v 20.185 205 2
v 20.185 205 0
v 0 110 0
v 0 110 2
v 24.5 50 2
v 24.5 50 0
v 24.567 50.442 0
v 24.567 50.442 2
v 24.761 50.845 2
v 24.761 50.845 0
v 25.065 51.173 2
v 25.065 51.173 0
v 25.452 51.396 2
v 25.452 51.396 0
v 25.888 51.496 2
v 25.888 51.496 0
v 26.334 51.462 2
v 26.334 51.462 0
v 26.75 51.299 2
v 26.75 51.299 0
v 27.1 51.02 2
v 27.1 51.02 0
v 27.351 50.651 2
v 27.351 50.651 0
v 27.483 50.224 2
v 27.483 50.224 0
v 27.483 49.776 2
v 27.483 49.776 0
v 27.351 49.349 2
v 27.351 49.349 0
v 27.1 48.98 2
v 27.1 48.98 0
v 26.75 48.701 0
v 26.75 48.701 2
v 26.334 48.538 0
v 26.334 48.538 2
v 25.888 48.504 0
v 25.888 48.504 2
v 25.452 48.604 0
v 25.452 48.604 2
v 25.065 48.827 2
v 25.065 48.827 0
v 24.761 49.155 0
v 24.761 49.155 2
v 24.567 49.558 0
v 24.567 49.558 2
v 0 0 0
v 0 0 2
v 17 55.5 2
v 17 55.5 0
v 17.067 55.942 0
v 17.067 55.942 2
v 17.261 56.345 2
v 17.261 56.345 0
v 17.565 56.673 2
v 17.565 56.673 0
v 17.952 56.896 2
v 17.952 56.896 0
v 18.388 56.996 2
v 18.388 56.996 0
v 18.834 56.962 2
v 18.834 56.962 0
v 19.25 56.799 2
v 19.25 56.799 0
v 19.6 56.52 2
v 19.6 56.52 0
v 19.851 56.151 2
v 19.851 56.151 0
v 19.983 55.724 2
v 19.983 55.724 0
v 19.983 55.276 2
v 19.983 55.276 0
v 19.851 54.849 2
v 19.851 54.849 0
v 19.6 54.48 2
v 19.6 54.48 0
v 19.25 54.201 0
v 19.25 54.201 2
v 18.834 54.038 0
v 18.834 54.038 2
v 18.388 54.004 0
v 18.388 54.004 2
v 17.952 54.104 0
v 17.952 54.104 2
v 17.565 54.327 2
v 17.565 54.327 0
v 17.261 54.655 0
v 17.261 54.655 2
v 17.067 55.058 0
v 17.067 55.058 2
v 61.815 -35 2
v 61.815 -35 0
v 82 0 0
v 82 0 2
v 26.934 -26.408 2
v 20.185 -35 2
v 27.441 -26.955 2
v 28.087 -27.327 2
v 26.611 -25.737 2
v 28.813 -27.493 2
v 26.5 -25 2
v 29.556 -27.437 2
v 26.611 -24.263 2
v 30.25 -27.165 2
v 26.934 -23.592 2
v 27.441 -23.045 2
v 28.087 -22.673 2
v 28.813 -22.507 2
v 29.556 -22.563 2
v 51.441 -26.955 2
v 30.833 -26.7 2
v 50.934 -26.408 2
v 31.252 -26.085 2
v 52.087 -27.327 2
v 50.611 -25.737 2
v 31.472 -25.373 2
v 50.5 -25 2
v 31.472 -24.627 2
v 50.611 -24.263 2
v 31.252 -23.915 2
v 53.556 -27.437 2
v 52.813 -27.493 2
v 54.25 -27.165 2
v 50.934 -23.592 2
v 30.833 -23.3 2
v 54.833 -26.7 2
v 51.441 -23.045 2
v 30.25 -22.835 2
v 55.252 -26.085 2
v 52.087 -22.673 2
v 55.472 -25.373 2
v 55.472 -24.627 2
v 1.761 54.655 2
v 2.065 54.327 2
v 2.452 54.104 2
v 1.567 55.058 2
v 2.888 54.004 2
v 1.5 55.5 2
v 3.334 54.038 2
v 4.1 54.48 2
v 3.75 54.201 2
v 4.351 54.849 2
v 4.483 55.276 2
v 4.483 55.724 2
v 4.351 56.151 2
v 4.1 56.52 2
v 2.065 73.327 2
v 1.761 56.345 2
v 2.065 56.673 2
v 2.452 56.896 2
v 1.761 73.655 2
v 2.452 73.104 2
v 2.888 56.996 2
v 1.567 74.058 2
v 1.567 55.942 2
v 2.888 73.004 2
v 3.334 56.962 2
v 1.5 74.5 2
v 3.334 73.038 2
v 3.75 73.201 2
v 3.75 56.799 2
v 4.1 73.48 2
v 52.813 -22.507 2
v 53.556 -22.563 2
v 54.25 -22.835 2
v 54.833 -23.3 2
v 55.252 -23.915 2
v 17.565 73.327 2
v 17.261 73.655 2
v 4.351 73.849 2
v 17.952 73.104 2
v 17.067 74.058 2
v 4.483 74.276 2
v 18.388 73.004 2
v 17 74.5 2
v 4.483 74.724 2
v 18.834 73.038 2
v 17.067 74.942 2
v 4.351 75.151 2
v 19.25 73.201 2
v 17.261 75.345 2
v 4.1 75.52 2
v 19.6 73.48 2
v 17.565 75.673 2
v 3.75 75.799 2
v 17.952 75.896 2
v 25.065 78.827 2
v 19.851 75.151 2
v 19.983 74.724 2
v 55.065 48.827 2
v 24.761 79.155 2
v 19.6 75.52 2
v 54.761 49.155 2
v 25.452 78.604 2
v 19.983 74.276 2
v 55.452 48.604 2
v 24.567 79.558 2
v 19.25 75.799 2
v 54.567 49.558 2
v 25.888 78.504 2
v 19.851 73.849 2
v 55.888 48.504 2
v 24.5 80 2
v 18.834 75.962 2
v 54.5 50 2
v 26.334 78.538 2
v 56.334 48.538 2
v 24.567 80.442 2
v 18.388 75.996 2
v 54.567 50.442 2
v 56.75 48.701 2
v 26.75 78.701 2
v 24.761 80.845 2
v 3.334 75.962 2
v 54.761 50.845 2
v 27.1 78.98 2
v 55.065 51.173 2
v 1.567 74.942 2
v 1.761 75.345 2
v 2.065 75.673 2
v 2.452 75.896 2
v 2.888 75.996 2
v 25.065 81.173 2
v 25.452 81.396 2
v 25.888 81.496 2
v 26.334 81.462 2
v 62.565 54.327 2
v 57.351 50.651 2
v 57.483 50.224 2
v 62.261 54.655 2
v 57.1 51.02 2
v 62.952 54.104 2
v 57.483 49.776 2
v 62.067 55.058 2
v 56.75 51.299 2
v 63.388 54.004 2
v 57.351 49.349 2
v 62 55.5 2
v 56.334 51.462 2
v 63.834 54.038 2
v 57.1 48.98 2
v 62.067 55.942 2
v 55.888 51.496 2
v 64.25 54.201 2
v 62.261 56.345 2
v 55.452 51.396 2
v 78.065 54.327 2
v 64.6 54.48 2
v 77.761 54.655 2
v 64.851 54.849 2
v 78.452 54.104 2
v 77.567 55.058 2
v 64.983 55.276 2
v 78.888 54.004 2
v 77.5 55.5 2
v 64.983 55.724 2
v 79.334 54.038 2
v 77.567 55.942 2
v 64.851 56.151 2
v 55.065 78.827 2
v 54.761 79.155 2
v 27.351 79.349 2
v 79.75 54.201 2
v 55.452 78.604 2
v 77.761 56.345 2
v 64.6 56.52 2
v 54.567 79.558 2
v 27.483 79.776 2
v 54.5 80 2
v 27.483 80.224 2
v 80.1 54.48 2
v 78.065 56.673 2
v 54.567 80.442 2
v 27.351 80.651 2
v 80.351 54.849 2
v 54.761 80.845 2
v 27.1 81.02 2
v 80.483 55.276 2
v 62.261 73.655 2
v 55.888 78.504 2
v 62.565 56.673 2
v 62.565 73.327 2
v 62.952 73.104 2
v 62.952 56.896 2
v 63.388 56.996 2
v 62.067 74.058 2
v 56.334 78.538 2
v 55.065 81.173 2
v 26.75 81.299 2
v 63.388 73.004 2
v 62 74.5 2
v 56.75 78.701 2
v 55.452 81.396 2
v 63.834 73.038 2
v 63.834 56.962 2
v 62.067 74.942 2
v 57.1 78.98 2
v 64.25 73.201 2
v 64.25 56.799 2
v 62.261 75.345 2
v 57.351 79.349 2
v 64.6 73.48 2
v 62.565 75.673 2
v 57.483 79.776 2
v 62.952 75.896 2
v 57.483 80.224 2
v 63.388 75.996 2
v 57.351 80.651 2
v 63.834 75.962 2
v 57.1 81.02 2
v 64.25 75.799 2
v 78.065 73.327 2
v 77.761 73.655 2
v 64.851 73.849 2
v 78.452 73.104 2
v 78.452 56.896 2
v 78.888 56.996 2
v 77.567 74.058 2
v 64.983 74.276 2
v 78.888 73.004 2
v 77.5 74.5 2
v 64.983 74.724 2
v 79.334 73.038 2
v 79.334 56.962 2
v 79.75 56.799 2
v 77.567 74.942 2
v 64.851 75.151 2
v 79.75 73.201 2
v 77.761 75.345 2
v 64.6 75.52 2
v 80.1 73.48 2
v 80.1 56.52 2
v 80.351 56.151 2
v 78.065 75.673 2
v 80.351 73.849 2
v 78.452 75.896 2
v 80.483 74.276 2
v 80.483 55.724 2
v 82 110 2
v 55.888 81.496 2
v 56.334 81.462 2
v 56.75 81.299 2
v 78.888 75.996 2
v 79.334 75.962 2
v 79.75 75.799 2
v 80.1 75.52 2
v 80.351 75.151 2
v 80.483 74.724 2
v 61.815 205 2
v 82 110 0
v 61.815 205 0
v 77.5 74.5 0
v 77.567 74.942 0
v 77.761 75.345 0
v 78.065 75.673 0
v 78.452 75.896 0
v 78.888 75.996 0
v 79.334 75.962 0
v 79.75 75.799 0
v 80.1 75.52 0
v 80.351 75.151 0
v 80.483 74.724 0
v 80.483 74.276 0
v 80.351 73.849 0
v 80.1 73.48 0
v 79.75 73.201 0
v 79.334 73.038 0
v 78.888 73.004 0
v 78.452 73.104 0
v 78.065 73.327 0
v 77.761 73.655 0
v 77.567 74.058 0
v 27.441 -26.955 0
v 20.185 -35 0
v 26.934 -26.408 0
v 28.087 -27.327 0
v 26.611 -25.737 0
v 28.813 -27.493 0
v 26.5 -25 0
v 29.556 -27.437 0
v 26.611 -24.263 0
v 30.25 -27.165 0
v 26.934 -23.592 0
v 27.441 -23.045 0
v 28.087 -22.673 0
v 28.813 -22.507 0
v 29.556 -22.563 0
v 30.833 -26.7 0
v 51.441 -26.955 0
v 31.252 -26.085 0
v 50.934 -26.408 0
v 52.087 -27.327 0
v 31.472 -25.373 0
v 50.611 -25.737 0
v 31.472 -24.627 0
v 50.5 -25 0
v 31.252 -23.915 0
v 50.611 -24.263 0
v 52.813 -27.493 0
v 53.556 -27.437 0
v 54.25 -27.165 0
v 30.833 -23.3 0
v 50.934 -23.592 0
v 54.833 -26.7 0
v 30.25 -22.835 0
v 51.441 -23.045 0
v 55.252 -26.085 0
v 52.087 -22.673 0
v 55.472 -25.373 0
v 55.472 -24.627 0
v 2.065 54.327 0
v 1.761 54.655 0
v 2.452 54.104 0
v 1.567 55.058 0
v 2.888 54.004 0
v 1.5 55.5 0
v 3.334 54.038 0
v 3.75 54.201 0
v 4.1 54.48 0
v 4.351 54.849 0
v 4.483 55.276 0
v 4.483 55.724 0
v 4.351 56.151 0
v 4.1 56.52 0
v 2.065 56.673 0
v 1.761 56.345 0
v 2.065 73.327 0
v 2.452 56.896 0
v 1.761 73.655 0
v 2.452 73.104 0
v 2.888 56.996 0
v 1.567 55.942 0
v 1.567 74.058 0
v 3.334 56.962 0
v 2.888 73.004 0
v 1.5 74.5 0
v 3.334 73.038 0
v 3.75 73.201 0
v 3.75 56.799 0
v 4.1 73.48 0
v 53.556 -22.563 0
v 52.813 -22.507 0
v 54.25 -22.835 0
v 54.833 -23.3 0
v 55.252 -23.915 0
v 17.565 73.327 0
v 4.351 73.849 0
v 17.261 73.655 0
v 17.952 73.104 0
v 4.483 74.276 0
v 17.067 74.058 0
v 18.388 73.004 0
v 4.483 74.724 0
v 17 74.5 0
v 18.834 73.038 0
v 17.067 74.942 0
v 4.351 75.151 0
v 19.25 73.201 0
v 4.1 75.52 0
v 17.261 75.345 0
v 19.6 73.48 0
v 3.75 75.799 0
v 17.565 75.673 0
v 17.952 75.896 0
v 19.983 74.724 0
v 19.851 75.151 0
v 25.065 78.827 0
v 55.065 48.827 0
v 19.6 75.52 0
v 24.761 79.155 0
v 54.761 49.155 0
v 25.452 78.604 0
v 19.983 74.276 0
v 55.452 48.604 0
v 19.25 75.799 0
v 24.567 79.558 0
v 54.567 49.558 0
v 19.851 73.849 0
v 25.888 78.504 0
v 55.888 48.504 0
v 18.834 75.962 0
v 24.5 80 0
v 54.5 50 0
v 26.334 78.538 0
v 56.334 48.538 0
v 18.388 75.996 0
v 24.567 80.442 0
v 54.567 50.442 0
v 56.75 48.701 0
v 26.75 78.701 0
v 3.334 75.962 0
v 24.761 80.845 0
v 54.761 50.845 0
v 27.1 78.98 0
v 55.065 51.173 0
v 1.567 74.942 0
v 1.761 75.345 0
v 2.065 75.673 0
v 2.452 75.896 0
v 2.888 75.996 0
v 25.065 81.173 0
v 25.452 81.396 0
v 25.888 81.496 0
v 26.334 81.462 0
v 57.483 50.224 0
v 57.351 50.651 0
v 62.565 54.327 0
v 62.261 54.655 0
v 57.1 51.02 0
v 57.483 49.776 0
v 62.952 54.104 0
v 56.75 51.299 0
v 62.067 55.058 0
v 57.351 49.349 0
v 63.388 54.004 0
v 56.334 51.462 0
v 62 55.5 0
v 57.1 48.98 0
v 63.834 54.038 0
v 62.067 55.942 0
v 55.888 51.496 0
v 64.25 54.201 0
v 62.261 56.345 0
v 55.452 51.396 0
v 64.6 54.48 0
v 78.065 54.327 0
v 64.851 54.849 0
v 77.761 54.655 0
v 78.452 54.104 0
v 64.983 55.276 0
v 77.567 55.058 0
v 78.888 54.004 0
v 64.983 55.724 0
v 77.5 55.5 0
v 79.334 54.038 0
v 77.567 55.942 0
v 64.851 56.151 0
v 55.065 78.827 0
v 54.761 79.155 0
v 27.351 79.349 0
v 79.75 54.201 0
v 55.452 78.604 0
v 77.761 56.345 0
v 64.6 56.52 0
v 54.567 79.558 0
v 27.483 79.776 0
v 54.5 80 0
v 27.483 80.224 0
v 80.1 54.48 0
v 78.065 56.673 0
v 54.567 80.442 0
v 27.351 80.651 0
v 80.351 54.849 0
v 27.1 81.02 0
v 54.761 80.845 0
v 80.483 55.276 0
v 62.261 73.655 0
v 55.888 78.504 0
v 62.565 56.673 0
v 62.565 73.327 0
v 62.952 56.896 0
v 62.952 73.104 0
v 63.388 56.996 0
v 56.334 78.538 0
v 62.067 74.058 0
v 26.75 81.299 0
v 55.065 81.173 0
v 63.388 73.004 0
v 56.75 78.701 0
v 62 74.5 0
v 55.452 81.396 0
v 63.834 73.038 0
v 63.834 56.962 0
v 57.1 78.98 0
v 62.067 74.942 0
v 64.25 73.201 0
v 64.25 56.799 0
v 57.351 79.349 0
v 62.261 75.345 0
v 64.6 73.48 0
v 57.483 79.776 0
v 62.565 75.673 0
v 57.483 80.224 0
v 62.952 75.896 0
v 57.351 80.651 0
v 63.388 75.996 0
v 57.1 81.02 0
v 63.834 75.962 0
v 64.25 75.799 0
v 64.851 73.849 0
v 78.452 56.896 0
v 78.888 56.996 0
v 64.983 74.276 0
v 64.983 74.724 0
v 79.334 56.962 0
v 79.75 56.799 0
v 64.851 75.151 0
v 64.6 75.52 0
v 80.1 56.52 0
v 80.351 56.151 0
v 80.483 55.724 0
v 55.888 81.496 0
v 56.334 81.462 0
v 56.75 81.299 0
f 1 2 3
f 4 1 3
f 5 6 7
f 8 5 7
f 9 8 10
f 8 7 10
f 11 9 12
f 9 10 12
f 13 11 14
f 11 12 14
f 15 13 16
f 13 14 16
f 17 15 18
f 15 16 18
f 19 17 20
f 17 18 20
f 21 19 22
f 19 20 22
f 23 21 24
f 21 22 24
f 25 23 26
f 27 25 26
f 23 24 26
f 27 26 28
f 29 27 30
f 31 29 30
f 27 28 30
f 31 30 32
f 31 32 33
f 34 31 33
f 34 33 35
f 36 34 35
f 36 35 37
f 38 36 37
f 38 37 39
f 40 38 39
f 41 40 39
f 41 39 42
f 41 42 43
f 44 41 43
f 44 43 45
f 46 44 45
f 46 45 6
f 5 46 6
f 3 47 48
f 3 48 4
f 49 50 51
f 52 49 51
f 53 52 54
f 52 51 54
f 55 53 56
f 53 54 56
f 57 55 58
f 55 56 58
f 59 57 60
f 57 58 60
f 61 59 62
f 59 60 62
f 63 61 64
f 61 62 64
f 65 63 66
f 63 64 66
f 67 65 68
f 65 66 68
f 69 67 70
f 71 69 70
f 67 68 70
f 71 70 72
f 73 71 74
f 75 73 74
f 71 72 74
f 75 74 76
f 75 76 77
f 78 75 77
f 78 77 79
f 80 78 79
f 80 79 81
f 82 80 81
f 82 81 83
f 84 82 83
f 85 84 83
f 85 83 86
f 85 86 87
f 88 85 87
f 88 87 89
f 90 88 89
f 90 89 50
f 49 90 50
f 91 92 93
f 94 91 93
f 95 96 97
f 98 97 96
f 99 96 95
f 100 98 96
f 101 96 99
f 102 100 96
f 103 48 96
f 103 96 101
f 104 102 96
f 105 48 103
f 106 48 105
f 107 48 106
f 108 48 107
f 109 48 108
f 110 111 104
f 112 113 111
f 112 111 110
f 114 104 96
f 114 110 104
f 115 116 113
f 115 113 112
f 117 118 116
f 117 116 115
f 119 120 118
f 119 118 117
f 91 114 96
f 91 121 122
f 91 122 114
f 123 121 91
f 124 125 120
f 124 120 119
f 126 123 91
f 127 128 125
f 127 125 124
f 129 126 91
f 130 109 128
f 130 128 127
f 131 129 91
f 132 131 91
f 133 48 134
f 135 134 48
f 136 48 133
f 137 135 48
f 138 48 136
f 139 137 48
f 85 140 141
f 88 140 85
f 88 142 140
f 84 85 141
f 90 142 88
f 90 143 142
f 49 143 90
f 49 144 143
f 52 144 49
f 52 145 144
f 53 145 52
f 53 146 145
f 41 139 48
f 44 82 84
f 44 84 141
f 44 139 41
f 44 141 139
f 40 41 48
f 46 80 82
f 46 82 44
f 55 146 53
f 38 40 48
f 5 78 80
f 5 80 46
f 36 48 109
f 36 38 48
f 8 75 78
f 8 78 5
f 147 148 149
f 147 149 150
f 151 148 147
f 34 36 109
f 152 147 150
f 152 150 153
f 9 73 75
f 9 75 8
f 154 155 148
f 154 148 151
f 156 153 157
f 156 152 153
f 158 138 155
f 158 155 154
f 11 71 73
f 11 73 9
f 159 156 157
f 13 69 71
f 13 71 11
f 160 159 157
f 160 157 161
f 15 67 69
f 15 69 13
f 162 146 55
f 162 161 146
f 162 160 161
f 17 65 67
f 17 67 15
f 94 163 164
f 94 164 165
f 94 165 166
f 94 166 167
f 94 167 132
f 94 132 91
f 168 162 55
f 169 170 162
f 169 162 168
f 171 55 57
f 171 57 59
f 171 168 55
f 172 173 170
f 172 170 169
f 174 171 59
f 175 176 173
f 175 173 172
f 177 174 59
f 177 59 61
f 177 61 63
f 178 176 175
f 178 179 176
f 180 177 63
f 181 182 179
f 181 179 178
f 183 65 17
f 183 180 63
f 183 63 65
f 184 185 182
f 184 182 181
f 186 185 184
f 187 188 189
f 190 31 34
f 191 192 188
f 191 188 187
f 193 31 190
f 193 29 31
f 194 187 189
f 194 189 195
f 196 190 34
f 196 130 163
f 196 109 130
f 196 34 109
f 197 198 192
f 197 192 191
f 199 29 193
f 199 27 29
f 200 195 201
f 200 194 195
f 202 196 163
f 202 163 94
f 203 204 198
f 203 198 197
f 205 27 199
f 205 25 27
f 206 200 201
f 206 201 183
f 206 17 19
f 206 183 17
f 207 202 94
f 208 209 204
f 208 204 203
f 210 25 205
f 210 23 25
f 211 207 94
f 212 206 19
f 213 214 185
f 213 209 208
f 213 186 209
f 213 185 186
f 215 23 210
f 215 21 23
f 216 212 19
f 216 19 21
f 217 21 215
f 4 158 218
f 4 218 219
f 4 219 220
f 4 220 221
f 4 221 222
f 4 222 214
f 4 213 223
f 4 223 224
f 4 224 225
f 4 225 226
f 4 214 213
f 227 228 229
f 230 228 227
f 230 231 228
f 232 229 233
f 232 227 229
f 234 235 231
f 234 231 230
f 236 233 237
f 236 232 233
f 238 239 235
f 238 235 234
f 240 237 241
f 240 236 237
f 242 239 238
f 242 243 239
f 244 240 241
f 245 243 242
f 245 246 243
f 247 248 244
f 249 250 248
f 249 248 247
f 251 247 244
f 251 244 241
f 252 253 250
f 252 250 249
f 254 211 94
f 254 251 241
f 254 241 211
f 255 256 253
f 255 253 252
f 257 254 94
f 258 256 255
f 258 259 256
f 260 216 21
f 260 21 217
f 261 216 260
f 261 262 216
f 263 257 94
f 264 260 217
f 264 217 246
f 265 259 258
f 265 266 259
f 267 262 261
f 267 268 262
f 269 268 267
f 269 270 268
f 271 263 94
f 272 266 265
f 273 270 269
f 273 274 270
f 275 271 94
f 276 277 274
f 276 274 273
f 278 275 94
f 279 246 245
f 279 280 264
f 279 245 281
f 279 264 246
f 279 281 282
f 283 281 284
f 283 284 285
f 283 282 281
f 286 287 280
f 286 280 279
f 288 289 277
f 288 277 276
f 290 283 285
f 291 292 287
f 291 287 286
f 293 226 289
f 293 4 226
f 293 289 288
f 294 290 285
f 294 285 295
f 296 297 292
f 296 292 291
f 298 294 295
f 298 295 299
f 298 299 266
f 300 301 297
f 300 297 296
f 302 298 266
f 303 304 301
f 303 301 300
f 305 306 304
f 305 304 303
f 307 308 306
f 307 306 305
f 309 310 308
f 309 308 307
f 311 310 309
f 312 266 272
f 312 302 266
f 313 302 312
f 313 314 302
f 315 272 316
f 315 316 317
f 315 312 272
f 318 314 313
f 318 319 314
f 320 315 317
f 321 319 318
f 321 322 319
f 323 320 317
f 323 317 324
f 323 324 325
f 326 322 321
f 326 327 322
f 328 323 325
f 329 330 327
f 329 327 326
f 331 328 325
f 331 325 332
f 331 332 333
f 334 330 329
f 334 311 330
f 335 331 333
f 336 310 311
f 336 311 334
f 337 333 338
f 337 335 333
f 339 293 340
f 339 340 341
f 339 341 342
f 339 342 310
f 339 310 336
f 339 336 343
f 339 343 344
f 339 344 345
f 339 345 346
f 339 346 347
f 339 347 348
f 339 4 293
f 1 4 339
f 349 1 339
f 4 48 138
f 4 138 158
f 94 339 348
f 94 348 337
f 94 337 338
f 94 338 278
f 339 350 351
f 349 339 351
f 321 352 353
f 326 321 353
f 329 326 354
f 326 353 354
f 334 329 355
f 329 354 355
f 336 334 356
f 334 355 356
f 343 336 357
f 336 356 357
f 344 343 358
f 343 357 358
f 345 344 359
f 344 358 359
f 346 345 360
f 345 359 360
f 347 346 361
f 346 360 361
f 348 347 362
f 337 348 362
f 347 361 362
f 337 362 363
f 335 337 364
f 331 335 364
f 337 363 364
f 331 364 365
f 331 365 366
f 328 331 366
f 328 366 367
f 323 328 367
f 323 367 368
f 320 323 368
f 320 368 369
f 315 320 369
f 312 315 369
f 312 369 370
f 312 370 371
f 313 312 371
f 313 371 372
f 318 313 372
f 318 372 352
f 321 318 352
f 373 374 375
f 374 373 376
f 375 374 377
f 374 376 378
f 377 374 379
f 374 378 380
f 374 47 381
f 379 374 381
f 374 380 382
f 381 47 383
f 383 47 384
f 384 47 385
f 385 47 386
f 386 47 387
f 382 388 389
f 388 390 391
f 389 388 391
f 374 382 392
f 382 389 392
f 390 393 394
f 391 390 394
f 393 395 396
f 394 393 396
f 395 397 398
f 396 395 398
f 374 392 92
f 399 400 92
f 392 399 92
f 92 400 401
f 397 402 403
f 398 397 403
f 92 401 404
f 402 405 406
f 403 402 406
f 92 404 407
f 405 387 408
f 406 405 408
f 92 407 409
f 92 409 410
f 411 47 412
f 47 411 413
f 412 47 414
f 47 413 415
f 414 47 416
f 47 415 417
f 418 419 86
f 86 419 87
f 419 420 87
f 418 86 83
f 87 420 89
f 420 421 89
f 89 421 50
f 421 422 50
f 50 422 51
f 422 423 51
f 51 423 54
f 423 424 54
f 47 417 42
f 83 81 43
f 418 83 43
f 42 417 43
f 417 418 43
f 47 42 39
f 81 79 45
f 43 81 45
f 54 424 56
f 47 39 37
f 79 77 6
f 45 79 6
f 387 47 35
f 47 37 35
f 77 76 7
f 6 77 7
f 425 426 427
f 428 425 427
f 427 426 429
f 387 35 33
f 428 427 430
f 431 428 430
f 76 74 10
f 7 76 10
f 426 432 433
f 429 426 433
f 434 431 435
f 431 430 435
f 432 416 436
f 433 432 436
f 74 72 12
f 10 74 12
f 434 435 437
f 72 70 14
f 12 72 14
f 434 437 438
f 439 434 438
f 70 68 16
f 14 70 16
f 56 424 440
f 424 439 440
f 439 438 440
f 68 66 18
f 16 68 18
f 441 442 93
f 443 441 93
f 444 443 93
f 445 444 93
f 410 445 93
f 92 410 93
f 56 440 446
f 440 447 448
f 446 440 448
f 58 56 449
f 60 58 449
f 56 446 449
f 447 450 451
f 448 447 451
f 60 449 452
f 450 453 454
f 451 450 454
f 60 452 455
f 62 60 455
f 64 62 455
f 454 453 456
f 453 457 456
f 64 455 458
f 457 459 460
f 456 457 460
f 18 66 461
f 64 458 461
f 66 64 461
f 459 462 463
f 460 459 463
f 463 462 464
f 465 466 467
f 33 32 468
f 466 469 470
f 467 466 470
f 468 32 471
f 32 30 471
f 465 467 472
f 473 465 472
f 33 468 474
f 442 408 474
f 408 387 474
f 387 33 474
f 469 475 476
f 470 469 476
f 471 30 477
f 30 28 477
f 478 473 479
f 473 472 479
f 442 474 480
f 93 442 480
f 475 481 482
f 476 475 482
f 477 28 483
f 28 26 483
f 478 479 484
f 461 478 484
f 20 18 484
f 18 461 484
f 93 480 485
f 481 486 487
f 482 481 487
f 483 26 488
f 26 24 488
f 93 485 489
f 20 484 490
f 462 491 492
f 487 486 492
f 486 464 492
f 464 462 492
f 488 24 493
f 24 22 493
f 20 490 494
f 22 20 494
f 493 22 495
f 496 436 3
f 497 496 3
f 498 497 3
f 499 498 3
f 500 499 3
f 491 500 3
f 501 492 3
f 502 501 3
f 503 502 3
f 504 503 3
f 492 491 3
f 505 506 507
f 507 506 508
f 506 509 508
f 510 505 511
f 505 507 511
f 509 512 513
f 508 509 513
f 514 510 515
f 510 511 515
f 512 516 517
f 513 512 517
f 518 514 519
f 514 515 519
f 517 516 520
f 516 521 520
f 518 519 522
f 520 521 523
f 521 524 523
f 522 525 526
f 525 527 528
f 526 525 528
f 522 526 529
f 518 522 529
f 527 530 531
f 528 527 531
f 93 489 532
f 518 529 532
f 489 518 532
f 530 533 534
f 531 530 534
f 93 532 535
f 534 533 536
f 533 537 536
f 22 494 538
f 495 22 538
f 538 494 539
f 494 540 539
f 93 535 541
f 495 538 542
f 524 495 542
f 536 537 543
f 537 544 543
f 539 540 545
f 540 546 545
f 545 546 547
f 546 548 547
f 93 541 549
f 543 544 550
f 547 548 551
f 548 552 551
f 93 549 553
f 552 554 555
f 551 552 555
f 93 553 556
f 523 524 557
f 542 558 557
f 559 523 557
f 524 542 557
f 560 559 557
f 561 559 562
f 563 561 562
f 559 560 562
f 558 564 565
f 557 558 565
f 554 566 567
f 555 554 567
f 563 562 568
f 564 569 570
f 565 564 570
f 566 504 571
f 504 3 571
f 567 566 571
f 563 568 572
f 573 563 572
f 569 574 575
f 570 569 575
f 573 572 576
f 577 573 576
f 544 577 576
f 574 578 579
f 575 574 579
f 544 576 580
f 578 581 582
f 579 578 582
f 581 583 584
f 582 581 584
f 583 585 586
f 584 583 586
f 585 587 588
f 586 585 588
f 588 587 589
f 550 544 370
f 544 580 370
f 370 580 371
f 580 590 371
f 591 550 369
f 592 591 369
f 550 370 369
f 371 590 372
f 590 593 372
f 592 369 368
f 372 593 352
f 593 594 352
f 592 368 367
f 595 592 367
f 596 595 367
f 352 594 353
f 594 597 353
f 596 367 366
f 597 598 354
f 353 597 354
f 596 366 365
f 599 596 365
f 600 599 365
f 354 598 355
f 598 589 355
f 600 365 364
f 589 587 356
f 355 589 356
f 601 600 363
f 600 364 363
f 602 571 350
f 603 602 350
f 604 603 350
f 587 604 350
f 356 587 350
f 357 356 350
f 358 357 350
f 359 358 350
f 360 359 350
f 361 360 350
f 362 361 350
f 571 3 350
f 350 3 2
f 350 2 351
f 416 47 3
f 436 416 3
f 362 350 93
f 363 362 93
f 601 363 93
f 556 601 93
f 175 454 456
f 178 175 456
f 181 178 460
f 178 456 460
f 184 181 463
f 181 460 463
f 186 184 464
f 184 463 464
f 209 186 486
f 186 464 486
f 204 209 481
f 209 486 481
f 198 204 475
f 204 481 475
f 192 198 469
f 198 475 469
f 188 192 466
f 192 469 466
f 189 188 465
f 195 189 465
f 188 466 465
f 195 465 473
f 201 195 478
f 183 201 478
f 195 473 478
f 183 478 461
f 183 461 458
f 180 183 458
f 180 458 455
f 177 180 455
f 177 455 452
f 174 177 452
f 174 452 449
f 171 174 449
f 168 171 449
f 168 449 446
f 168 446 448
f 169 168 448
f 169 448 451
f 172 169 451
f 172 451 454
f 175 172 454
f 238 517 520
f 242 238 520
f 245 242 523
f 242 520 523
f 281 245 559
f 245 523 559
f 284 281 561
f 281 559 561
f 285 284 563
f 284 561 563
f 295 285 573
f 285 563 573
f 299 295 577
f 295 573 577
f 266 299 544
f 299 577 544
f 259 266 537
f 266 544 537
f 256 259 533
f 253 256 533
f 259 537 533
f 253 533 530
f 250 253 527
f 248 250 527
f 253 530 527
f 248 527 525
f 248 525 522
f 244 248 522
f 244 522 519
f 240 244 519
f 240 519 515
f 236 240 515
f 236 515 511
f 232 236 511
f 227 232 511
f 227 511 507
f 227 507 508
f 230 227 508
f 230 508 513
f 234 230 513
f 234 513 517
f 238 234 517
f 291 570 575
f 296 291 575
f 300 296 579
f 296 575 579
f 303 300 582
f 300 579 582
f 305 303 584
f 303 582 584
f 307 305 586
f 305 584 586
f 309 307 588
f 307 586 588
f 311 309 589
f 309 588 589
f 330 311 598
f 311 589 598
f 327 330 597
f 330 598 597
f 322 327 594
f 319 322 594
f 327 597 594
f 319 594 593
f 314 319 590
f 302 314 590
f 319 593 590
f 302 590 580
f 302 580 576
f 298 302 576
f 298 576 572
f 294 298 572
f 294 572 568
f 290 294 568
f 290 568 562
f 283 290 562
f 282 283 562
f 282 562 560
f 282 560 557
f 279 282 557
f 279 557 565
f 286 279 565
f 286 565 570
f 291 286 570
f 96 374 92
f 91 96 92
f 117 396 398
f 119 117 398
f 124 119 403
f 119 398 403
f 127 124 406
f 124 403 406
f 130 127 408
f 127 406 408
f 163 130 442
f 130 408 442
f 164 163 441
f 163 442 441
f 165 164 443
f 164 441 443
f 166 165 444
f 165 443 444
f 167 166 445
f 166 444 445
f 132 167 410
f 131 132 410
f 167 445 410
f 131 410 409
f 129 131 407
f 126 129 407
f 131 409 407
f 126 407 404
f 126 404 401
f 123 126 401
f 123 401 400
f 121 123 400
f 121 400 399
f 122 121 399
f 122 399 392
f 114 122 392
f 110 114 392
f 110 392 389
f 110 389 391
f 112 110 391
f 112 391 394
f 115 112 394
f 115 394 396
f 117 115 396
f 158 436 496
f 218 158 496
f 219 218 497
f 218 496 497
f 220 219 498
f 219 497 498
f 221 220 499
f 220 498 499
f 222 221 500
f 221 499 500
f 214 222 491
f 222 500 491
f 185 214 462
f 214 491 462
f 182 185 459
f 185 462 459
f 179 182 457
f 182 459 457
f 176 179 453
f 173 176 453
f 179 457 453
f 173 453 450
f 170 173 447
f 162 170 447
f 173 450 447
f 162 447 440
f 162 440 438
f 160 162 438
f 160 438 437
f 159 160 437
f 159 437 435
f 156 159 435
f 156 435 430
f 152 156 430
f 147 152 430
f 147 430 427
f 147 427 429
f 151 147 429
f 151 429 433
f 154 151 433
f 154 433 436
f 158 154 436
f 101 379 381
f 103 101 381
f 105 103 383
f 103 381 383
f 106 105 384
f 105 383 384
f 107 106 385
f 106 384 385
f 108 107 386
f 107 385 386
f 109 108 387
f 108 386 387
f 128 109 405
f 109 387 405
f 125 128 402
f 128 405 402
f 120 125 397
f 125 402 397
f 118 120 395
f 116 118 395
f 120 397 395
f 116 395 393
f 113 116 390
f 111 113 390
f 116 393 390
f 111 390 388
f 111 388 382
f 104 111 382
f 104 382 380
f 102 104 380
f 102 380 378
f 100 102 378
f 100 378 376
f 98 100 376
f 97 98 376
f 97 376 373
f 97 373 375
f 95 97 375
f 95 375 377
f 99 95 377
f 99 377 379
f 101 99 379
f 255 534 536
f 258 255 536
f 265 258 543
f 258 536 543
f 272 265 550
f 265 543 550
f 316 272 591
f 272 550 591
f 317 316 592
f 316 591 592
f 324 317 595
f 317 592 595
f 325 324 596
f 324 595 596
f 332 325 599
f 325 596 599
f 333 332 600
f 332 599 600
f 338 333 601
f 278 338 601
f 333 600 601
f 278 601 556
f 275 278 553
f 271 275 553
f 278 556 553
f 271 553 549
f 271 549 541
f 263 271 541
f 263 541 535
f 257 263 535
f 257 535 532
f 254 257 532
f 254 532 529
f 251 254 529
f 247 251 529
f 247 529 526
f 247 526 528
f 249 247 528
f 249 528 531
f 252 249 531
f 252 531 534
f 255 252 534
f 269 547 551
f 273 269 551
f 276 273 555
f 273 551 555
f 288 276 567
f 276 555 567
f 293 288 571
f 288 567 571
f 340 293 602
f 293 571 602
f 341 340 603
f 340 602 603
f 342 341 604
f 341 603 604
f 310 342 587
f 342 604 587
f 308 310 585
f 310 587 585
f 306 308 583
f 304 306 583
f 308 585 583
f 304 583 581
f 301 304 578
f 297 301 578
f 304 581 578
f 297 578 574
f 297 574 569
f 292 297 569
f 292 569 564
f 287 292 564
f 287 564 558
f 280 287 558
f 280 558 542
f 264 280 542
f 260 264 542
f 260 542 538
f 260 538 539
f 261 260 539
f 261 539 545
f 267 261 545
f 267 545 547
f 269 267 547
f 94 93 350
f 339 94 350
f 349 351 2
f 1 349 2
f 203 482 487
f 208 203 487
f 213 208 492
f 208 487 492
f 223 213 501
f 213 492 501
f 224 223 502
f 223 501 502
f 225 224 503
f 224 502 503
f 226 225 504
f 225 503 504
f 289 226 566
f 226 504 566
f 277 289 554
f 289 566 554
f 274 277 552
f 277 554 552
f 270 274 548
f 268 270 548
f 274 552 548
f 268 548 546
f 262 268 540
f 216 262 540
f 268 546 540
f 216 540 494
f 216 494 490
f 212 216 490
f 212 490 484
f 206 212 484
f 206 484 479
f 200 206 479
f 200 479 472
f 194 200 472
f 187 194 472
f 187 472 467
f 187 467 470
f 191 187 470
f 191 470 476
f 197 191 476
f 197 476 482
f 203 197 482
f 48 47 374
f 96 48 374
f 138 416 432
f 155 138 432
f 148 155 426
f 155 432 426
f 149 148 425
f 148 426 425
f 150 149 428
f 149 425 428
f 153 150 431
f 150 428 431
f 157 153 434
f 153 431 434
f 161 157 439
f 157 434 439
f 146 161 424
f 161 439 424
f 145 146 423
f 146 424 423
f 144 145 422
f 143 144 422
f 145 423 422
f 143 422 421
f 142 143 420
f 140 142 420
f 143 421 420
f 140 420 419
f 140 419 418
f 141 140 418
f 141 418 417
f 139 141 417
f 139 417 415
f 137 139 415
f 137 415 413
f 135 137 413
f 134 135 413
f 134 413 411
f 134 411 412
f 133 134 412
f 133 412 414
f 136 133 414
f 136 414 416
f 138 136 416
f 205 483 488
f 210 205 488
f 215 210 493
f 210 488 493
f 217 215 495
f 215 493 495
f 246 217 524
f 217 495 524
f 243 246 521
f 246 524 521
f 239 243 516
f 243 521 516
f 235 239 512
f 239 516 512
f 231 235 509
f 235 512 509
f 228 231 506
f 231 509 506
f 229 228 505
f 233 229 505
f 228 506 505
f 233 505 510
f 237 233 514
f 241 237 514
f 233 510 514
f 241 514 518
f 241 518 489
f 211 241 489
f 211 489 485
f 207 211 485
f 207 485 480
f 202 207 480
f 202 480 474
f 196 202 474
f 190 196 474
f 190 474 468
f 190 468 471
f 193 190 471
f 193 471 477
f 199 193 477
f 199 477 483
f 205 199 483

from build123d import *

# Parameters (mm, degrees)
F0_W     = 82
F0_H     = 110
F1_DEPTH = 2
F3_D     = 3
F5_D     = 5
F7_D     = 3


with BuildPart() as f1:
    # F0 (on Top) → F1 (new body)
    with BuildSketch(Plane.XY):
        Polygon((20.1851744205, 205), (0, 110), (82, 110), (61.8148255795, 205), align=None)
        with Locations((41, 55)):
            Rectangle(F0_W, F0_H)
        Polygon((82, 0), (0, 0), (20.1851744205, -35), (61.8148255795, -35), align=None)
    extrude(amount=F1_DEPTH)

    # F3 (through all)
    with Locations(Plane.XY.offset(2)):
        with Locations((18.5, 55.5), (3, 55.5), (3, 74.5), (18.5, 74.5), (63.5, 74.5), (63.5, 55.5), (79, 55.5), (79, 74.5)):
            Hole(F3_D / 2)

    # F5 (through all)
    with Locations(Plane.XY.offset(2)):
        with Locations((29, -25), (53, -25)):
            Hole(F5_D / 2)

    # F7 (through all)
    with Locations(Plane.XY.offset(2)):
        with Locations((26, 80), (56, 50), (56, 80), (26, 50)):
            Hole(F7_D / 2)


solid = f1.part
